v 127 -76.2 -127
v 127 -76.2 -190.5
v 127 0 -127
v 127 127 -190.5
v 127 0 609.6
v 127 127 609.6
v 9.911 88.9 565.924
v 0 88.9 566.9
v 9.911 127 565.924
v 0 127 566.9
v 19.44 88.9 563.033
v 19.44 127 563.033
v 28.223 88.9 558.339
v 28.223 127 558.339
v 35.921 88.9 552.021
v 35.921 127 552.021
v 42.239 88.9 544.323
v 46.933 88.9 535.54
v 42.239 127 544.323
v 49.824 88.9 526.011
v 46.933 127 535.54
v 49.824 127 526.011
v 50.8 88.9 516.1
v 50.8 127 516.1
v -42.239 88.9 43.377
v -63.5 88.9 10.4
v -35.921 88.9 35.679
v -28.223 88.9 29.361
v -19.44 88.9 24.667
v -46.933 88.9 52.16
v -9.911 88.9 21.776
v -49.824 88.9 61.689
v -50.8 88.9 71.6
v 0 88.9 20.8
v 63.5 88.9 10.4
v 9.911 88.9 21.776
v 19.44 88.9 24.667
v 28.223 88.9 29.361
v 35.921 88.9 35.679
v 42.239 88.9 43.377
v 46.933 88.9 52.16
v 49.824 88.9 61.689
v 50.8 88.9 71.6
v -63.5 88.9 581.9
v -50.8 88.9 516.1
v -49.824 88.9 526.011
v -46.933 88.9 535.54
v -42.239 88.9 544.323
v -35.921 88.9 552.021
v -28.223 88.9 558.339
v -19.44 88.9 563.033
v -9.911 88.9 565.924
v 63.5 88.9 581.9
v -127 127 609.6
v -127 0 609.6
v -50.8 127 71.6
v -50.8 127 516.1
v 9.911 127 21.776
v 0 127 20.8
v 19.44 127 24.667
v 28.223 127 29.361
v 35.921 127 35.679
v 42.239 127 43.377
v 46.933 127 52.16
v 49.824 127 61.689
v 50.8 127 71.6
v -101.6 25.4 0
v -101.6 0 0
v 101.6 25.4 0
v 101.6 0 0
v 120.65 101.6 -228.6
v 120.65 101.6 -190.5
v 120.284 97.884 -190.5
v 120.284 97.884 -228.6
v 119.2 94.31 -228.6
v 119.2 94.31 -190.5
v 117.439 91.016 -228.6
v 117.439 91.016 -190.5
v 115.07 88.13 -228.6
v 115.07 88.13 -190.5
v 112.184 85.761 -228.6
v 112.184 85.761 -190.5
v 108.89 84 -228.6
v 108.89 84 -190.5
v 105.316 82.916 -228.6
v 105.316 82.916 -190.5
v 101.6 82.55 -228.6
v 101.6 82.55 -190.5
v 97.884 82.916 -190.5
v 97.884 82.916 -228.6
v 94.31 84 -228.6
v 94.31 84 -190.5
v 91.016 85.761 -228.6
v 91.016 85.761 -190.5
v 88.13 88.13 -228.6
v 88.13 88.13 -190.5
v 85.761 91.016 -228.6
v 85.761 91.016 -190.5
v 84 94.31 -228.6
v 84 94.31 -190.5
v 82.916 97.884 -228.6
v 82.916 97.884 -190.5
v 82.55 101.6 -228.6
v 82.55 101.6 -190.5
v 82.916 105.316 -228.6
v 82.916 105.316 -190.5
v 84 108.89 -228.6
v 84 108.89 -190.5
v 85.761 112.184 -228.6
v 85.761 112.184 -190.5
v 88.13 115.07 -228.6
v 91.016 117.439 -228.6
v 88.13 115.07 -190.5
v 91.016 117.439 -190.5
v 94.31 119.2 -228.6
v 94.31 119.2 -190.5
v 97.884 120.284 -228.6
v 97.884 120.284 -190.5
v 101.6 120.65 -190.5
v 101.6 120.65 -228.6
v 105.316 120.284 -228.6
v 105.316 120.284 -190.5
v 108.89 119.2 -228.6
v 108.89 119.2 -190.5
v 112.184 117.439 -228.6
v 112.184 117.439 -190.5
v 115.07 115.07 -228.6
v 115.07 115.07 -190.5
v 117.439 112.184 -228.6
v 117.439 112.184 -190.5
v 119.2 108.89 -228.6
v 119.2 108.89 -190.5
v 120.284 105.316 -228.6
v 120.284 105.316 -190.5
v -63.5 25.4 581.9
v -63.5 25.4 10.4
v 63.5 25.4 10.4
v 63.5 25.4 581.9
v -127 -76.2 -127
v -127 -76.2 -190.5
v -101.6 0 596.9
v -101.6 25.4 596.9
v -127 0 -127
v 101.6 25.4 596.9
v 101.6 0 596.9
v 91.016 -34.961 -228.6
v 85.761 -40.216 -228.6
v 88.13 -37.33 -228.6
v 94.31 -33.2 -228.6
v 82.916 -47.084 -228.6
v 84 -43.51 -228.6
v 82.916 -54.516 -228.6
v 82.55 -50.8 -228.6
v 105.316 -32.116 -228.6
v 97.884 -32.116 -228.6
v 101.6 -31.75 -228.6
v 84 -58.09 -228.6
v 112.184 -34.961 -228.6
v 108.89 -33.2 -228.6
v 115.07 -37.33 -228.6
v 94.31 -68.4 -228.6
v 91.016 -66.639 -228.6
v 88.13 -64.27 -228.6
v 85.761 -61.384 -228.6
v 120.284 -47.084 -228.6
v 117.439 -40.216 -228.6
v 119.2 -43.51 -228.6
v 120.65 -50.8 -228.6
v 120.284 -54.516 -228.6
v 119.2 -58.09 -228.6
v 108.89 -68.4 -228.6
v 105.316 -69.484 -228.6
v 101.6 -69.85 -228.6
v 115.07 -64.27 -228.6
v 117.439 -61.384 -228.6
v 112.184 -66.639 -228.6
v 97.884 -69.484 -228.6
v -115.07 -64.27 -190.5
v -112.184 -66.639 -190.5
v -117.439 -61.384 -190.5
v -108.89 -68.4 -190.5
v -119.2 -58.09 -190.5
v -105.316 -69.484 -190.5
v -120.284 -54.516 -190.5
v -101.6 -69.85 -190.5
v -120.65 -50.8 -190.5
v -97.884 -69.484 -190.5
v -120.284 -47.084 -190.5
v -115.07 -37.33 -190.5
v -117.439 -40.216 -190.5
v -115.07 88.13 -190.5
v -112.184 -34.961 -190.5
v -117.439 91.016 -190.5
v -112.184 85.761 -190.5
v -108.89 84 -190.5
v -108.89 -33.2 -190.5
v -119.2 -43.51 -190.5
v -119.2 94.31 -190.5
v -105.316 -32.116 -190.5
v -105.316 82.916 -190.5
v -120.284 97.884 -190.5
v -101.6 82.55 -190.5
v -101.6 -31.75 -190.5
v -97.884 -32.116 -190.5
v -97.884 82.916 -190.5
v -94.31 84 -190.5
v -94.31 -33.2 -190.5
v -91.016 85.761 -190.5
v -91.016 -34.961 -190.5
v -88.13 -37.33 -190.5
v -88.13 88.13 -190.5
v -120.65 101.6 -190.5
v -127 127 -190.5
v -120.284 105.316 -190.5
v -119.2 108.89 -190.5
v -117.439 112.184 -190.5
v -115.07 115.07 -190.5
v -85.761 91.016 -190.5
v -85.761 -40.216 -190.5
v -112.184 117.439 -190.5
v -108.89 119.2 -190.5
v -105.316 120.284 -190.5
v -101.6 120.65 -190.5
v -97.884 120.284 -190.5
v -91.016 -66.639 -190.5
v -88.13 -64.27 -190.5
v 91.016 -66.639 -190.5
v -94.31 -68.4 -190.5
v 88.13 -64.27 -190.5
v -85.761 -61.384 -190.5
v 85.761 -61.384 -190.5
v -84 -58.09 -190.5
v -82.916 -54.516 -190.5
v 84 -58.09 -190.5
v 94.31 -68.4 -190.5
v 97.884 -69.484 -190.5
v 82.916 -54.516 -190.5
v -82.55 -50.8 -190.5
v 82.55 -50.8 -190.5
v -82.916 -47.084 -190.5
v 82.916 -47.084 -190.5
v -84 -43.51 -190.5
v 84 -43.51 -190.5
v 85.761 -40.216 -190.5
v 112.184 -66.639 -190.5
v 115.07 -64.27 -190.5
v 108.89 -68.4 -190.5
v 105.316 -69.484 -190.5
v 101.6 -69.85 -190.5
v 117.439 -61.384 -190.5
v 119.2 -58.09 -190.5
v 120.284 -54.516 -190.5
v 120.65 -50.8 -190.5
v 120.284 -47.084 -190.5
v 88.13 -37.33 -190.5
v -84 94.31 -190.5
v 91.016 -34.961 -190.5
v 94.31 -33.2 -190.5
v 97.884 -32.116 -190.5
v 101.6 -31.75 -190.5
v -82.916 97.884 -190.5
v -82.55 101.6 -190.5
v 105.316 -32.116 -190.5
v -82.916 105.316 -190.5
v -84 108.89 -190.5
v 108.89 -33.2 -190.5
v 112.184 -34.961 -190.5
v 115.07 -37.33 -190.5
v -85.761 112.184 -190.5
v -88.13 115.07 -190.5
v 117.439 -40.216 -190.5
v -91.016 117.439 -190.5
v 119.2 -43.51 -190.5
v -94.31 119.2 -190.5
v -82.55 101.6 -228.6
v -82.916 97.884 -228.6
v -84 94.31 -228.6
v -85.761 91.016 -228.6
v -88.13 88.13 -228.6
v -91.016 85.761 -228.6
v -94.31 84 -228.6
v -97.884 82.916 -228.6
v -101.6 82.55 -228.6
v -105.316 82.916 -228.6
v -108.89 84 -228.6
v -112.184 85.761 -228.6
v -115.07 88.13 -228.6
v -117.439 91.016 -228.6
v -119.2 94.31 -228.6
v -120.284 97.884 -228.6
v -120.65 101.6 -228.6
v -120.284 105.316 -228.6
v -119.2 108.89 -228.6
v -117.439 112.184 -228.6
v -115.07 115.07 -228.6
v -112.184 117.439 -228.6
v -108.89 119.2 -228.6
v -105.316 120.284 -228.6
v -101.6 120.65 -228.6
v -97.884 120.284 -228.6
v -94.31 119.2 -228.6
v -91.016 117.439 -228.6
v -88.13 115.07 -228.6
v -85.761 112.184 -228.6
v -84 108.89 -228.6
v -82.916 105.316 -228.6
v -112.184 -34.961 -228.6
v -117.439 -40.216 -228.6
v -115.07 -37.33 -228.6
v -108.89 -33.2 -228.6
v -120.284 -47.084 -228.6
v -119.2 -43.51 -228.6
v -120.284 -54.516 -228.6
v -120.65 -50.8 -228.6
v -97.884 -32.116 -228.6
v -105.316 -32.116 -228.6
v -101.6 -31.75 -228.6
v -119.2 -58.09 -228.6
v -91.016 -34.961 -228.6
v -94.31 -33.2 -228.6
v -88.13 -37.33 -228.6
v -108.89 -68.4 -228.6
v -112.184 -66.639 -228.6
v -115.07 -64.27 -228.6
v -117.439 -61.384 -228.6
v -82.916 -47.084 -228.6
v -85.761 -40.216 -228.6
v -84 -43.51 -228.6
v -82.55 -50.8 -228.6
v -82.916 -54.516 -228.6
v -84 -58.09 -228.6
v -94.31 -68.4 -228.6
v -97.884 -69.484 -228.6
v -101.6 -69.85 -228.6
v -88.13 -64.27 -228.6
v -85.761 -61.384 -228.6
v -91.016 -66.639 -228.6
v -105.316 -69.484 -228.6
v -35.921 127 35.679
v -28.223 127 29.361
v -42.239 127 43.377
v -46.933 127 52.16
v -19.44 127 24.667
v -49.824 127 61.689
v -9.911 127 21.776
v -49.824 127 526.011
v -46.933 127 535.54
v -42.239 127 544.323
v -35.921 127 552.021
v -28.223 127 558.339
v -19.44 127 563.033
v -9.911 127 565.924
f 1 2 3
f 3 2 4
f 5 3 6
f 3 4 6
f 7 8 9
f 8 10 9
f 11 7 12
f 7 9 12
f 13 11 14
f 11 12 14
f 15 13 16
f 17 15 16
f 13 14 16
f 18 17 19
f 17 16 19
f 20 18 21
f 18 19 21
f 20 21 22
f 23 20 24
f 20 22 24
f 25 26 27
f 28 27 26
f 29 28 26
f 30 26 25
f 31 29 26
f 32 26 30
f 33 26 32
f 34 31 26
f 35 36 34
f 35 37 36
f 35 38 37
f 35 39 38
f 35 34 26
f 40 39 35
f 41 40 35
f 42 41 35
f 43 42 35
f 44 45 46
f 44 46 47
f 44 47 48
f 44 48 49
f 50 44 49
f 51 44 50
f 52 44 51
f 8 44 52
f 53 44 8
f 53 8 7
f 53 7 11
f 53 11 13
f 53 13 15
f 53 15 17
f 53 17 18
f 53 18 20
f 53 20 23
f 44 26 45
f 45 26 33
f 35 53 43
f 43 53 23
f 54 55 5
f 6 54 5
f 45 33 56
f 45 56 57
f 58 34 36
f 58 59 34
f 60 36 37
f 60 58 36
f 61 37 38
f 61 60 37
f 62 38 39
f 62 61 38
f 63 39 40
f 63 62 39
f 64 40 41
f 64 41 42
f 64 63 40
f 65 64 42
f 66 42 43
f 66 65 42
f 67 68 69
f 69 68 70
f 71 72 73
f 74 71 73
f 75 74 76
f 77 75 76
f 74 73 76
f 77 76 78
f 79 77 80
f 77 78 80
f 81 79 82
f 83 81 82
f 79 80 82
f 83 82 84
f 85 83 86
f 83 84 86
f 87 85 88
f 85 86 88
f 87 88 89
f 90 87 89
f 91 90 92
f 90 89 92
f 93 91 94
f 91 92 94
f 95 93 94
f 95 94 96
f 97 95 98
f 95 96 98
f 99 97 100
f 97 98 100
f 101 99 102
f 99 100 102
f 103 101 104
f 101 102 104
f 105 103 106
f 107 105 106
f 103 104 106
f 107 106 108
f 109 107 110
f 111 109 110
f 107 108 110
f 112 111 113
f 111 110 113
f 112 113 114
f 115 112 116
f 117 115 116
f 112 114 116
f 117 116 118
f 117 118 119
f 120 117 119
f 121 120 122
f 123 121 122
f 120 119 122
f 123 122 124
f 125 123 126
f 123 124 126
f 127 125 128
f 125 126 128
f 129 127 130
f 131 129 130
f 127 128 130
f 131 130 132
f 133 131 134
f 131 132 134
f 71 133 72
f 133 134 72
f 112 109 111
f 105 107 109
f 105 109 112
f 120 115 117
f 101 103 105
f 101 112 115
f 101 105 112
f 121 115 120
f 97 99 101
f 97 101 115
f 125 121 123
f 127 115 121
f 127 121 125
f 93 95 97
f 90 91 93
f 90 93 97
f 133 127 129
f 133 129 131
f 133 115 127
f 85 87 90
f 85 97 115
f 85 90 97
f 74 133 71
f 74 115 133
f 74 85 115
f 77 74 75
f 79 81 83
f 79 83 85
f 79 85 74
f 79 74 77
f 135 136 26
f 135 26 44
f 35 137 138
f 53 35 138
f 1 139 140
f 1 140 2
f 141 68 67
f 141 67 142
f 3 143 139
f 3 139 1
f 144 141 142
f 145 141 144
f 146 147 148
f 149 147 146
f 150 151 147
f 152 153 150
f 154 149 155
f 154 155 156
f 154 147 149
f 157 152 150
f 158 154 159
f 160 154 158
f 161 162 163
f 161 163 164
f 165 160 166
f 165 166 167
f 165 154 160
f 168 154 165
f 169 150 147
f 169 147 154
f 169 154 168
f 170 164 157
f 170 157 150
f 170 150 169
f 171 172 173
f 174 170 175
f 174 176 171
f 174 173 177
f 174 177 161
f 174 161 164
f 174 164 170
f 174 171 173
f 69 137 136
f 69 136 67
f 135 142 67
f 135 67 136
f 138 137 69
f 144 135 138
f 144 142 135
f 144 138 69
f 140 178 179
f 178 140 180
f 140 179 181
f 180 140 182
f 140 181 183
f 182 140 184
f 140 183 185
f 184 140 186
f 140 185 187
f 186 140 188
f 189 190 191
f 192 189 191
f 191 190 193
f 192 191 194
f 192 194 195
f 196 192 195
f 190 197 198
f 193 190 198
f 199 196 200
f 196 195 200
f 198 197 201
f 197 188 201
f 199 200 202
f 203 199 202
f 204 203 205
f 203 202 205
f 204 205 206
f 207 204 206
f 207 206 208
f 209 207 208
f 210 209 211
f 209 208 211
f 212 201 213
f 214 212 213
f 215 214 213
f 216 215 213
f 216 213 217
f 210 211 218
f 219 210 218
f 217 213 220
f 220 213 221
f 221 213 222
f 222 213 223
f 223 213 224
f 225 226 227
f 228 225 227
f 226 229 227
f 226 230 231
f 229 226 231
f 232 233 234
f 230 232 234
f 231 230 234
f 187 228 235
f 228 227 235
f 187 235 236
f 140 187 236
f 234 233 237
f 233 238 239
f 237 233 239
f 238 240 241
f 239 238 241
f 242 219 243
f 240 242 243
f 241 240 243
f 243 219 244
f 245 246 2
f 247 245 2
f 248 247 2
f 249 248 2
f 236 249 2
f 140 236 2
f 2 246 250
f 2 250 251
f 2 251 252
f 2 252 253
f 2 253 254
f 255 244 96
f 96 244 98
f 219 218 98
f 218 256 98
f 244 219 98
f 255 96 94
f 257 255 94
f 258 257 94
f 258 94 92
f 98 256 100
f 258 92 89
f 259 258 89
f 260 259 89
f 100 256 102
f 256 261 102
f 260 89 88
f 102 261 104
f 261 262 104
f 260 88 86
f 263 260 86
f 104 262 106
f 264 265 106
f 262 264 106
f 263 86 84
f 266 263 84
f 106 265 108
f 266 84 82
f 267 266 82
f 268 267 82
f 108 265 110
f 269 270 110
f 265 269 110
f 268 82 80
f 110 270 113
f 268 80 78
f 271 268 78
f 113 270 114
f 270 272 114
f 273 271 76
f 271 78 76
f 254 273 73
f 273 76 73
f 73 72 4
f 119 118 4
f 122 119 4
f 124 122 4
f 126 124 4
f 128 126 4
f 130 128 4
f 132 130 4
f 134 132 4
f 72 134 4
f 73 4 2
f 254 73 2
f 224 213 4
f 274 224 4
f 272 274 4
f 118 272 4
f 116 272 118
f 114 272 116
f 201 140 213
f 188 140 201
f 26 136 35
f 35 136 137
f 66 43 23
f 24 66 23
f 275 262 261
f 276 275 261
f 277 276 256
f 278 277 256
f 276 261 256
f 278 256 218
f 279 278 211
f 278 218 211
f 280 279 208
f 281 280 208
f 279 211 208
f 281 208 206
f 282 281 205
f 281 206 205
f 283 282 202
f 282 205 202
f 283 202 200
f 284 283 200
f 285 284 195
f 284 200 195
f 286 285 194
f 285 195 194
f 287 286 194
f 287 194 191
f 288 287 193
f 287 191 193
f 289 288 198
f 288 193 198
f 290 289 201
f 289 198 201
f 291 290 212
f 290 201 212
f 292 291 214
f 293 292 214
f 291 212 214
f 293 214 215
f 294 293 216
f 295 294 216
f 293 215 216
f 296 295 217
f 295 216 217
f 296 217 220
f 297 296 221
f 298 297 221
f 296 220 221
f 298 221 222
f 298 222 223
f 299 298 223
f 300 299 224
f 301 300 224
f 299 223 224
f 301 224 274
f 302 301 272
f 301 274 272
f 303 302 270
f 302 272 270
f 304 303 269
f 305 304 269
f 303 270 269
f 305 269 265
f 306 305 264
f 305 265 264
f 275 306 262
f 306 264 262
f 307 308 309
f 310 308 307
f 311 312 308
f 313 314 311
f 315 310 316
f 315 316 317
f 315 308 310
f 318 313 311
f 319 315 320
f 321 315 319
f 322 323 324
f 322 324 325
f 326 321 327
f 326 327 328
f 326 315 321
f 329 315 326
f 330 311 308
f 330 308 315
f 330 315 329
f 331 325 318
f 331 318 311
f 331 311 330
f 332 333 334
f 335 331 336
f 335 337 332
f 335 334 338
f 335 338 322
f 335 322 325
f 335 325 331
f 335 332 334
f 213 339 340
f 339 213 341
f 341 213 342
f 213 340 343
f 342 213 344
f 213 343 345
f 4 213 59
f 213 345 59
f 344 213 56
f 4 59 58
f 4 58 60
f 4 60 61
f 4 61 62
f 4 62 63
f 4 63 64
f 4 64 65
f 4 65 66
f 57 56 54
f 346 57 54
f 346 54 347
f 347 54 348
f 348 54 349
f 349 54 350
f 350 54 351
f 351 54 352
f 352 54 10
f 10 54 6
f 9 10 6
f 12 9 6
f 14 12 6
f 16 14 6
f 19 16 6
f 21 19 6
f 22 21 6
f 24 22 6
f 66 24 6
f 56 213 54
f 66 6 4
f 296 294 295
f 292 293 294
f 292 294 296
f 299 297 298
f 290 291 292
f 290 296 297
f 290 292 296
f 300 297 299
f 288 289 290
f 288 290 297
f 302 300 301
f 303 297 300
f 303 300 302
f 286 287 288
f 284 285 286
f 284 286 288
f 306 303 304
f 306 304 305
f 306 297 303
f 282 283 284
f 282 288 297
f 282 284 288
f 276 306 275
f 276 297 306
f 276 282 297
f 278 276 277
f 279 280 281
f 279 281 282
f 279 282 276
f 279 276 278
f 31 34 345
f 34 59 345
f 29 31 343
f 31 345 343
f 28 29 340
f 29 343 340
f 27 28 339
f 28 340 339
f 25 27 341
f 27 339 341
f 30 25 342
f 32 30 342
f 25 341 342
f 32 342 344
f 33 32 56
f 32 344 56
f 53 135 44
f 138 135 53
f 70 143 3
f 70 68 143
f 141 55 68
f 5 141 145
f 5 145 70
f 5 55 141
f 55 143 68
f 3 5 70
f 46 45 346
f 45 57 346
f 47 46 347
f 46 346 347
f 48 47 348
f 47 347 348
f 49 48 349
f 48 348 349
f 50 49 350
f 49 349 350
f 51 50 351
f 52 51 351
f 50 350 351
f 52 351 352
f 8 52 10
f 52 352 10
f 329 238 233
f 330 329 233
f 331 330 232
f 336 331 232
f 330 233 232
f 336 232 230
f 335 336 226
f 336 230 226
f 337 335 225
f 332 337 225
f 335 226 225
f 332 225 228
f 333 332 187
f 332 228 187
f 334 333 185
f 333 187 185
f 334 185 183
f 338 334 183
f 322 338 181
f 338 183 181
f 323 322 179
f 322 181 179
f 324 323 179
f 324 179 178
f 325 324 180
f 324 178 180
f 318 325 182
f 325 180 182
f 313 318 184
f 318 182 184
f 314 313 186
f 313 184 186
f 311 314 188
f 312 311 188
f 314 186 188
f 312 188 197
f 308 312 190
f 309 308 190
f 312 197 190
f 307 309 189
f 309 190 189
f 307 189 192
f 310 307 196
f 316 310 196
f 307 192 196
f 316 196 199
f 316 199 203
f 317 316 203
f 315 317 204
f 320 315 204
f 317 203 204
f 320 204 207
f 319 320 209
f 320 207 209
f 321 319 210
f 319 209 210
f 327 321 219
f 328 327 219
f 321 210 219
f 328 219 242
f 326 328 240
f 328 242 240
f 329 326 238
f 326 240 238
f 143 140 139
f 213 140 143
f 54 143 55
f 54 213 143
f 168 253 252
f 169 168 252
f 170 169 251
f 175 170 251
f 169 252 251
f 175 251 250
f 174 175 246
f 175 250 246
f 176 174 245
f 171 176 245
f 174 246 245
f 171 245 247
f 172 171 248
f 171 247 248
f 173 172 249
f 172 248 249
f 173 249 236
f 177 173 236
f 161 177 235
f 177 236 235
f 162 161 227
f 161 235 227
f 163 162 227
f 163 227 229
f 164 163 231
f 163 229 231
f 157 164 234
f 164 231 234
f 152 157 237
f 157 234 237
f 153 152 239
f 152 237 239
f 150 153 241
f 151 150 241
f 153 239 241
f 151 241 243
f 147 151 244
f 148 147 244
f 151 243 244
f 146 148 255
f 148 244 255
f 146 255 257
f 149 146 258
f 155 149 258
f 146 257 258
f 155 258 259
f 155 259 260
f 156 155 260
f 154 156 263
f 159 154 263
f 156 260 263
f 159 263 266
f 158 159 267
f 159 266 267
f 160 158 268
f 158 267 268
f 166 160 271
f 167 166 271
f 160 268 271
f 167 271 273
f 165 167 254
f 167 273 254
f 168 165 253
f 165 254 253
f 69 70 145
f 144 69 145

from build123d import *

# Parameters (mm, degrees)
F0_W     = 254
F0_H     = 736.6
F0_W_2   = 203.2
F0_H_2   = 596.9
F0_W_3   = 127
F0_H_3   = 571.5
F0_W_4   = 101.6
F0_H_4   = 546.1
F0_H_5   = 63.5
F1_DEPTH = 127
F2_DEPTH = 25.4
F3_DEPTH = 88.9
F4_R     = 50.79999
F5_DEPTH = 76.2
F6_R     = 19.05
F7_DEPTH = 38.1


# Not quite as in the source:
# - a fillet or chamfer is up to 0.001 mm smaller than in the source, because OpenCascade refuses the exact size
# - a feature names something its author has since deleted; it is built from what else it names


with BuildPart() as f1:
    # F0 (on Front) → F1 (new body)
    with BuildSketch(Plane.XZ):
        with Locations((0, 241.3)):
            Rectangle(F0_W, F0_H)
        with Locations((0, 298.45)):
            Rectangle(F0_W_2, F0_H_2, mode=Mode.SUBTRACT)
        with Locations((0, 298.45)):
            Rectangle(F0_W_2, F0_H_2)
        with Locations((0, 296.15)):
            Rectangle(F0_W_3, F0_H_3, mode=Mode.SUBTRACT)
        with Locations((0, 296.15)):
            Rectangle(F0_W_3, F0_H_3)
        with Locations((0, 293.85)):
            Rectangle(F0_W_4, F0_H_4, mode=Mode.SUBTRACT)
        with Locations((0, -158.75)):
            Rectangle(F0_W, F0_H_5)
    extrude(amount=-F1_DEPTH)

    # F0 (on Front) → F2 (cut)
    with BuildSketch(Plane.XZ):
        with Locations((0, 298.45)):
            Rectangle(F0_W_2, F0_H_2)
        with Locations((0, 296.15)):
            Rectangle(F0_W_3, F0_H_3, mode=Mode.SUBTRACT)
    extrude(amount=-F2_DEPTH, mode=Mode.SUBTRACT)

    # F0 (on Front) → F3 (cut)
    with BuildSketch(Plane.XZ):
        with Locations((0, 296.15)):
            Rectangle(F0_W_3, F0_H_3)
        with Locations((0, 293.85)):
            Rectangle(F0_W_4, F0_H_4, mode=Mode.SUBTRACT)
    extrude(amount=-F3_DEPTH, mode=Mode.SUBTRACT)

    # F4 (radius 50.8 in the source; OpenCascade refuses exactly that, so slightly less here)
    f4_edges = [f1.edges().sort_by_distance(p)[0] for p in [
        (50.8, 107.95, 566.9),
        (-50.8, 107.95, 566.9),
        (-50.8, 107.95, 20.8),
        (50.8, 107.95, 20.8),
    ]]
    fillet(f4_edges, radius=F4_R)

    # F0 (on Front) → F5 (join)
    with BuildSketch(Plane.XZ):
        with Locations((0, -158.75)):
            Rectangle(F0_W, F0_H_5)
    extrude(amount=F5_DEPTH)

    # F6 (on face) → F7 (join)
    with BuildSketch(Plane(origin=(0, 0, -190.5), x_dir=(1, 0, 0), z_dir=(0, 0, -1))):
        with Locations((-101.6, 50.8)):
            Circle(F6_R)
        with Locations((101.6, 50.8)):
            Circle(F6_R)
        with Locations((-101.6, -101.6)):
            Circle(F6_R)
        with Locations((101.6, -101.6)):
            Circle(F6_R)
    extrude(amount=F7_DEPTH)


solid = f1.part
